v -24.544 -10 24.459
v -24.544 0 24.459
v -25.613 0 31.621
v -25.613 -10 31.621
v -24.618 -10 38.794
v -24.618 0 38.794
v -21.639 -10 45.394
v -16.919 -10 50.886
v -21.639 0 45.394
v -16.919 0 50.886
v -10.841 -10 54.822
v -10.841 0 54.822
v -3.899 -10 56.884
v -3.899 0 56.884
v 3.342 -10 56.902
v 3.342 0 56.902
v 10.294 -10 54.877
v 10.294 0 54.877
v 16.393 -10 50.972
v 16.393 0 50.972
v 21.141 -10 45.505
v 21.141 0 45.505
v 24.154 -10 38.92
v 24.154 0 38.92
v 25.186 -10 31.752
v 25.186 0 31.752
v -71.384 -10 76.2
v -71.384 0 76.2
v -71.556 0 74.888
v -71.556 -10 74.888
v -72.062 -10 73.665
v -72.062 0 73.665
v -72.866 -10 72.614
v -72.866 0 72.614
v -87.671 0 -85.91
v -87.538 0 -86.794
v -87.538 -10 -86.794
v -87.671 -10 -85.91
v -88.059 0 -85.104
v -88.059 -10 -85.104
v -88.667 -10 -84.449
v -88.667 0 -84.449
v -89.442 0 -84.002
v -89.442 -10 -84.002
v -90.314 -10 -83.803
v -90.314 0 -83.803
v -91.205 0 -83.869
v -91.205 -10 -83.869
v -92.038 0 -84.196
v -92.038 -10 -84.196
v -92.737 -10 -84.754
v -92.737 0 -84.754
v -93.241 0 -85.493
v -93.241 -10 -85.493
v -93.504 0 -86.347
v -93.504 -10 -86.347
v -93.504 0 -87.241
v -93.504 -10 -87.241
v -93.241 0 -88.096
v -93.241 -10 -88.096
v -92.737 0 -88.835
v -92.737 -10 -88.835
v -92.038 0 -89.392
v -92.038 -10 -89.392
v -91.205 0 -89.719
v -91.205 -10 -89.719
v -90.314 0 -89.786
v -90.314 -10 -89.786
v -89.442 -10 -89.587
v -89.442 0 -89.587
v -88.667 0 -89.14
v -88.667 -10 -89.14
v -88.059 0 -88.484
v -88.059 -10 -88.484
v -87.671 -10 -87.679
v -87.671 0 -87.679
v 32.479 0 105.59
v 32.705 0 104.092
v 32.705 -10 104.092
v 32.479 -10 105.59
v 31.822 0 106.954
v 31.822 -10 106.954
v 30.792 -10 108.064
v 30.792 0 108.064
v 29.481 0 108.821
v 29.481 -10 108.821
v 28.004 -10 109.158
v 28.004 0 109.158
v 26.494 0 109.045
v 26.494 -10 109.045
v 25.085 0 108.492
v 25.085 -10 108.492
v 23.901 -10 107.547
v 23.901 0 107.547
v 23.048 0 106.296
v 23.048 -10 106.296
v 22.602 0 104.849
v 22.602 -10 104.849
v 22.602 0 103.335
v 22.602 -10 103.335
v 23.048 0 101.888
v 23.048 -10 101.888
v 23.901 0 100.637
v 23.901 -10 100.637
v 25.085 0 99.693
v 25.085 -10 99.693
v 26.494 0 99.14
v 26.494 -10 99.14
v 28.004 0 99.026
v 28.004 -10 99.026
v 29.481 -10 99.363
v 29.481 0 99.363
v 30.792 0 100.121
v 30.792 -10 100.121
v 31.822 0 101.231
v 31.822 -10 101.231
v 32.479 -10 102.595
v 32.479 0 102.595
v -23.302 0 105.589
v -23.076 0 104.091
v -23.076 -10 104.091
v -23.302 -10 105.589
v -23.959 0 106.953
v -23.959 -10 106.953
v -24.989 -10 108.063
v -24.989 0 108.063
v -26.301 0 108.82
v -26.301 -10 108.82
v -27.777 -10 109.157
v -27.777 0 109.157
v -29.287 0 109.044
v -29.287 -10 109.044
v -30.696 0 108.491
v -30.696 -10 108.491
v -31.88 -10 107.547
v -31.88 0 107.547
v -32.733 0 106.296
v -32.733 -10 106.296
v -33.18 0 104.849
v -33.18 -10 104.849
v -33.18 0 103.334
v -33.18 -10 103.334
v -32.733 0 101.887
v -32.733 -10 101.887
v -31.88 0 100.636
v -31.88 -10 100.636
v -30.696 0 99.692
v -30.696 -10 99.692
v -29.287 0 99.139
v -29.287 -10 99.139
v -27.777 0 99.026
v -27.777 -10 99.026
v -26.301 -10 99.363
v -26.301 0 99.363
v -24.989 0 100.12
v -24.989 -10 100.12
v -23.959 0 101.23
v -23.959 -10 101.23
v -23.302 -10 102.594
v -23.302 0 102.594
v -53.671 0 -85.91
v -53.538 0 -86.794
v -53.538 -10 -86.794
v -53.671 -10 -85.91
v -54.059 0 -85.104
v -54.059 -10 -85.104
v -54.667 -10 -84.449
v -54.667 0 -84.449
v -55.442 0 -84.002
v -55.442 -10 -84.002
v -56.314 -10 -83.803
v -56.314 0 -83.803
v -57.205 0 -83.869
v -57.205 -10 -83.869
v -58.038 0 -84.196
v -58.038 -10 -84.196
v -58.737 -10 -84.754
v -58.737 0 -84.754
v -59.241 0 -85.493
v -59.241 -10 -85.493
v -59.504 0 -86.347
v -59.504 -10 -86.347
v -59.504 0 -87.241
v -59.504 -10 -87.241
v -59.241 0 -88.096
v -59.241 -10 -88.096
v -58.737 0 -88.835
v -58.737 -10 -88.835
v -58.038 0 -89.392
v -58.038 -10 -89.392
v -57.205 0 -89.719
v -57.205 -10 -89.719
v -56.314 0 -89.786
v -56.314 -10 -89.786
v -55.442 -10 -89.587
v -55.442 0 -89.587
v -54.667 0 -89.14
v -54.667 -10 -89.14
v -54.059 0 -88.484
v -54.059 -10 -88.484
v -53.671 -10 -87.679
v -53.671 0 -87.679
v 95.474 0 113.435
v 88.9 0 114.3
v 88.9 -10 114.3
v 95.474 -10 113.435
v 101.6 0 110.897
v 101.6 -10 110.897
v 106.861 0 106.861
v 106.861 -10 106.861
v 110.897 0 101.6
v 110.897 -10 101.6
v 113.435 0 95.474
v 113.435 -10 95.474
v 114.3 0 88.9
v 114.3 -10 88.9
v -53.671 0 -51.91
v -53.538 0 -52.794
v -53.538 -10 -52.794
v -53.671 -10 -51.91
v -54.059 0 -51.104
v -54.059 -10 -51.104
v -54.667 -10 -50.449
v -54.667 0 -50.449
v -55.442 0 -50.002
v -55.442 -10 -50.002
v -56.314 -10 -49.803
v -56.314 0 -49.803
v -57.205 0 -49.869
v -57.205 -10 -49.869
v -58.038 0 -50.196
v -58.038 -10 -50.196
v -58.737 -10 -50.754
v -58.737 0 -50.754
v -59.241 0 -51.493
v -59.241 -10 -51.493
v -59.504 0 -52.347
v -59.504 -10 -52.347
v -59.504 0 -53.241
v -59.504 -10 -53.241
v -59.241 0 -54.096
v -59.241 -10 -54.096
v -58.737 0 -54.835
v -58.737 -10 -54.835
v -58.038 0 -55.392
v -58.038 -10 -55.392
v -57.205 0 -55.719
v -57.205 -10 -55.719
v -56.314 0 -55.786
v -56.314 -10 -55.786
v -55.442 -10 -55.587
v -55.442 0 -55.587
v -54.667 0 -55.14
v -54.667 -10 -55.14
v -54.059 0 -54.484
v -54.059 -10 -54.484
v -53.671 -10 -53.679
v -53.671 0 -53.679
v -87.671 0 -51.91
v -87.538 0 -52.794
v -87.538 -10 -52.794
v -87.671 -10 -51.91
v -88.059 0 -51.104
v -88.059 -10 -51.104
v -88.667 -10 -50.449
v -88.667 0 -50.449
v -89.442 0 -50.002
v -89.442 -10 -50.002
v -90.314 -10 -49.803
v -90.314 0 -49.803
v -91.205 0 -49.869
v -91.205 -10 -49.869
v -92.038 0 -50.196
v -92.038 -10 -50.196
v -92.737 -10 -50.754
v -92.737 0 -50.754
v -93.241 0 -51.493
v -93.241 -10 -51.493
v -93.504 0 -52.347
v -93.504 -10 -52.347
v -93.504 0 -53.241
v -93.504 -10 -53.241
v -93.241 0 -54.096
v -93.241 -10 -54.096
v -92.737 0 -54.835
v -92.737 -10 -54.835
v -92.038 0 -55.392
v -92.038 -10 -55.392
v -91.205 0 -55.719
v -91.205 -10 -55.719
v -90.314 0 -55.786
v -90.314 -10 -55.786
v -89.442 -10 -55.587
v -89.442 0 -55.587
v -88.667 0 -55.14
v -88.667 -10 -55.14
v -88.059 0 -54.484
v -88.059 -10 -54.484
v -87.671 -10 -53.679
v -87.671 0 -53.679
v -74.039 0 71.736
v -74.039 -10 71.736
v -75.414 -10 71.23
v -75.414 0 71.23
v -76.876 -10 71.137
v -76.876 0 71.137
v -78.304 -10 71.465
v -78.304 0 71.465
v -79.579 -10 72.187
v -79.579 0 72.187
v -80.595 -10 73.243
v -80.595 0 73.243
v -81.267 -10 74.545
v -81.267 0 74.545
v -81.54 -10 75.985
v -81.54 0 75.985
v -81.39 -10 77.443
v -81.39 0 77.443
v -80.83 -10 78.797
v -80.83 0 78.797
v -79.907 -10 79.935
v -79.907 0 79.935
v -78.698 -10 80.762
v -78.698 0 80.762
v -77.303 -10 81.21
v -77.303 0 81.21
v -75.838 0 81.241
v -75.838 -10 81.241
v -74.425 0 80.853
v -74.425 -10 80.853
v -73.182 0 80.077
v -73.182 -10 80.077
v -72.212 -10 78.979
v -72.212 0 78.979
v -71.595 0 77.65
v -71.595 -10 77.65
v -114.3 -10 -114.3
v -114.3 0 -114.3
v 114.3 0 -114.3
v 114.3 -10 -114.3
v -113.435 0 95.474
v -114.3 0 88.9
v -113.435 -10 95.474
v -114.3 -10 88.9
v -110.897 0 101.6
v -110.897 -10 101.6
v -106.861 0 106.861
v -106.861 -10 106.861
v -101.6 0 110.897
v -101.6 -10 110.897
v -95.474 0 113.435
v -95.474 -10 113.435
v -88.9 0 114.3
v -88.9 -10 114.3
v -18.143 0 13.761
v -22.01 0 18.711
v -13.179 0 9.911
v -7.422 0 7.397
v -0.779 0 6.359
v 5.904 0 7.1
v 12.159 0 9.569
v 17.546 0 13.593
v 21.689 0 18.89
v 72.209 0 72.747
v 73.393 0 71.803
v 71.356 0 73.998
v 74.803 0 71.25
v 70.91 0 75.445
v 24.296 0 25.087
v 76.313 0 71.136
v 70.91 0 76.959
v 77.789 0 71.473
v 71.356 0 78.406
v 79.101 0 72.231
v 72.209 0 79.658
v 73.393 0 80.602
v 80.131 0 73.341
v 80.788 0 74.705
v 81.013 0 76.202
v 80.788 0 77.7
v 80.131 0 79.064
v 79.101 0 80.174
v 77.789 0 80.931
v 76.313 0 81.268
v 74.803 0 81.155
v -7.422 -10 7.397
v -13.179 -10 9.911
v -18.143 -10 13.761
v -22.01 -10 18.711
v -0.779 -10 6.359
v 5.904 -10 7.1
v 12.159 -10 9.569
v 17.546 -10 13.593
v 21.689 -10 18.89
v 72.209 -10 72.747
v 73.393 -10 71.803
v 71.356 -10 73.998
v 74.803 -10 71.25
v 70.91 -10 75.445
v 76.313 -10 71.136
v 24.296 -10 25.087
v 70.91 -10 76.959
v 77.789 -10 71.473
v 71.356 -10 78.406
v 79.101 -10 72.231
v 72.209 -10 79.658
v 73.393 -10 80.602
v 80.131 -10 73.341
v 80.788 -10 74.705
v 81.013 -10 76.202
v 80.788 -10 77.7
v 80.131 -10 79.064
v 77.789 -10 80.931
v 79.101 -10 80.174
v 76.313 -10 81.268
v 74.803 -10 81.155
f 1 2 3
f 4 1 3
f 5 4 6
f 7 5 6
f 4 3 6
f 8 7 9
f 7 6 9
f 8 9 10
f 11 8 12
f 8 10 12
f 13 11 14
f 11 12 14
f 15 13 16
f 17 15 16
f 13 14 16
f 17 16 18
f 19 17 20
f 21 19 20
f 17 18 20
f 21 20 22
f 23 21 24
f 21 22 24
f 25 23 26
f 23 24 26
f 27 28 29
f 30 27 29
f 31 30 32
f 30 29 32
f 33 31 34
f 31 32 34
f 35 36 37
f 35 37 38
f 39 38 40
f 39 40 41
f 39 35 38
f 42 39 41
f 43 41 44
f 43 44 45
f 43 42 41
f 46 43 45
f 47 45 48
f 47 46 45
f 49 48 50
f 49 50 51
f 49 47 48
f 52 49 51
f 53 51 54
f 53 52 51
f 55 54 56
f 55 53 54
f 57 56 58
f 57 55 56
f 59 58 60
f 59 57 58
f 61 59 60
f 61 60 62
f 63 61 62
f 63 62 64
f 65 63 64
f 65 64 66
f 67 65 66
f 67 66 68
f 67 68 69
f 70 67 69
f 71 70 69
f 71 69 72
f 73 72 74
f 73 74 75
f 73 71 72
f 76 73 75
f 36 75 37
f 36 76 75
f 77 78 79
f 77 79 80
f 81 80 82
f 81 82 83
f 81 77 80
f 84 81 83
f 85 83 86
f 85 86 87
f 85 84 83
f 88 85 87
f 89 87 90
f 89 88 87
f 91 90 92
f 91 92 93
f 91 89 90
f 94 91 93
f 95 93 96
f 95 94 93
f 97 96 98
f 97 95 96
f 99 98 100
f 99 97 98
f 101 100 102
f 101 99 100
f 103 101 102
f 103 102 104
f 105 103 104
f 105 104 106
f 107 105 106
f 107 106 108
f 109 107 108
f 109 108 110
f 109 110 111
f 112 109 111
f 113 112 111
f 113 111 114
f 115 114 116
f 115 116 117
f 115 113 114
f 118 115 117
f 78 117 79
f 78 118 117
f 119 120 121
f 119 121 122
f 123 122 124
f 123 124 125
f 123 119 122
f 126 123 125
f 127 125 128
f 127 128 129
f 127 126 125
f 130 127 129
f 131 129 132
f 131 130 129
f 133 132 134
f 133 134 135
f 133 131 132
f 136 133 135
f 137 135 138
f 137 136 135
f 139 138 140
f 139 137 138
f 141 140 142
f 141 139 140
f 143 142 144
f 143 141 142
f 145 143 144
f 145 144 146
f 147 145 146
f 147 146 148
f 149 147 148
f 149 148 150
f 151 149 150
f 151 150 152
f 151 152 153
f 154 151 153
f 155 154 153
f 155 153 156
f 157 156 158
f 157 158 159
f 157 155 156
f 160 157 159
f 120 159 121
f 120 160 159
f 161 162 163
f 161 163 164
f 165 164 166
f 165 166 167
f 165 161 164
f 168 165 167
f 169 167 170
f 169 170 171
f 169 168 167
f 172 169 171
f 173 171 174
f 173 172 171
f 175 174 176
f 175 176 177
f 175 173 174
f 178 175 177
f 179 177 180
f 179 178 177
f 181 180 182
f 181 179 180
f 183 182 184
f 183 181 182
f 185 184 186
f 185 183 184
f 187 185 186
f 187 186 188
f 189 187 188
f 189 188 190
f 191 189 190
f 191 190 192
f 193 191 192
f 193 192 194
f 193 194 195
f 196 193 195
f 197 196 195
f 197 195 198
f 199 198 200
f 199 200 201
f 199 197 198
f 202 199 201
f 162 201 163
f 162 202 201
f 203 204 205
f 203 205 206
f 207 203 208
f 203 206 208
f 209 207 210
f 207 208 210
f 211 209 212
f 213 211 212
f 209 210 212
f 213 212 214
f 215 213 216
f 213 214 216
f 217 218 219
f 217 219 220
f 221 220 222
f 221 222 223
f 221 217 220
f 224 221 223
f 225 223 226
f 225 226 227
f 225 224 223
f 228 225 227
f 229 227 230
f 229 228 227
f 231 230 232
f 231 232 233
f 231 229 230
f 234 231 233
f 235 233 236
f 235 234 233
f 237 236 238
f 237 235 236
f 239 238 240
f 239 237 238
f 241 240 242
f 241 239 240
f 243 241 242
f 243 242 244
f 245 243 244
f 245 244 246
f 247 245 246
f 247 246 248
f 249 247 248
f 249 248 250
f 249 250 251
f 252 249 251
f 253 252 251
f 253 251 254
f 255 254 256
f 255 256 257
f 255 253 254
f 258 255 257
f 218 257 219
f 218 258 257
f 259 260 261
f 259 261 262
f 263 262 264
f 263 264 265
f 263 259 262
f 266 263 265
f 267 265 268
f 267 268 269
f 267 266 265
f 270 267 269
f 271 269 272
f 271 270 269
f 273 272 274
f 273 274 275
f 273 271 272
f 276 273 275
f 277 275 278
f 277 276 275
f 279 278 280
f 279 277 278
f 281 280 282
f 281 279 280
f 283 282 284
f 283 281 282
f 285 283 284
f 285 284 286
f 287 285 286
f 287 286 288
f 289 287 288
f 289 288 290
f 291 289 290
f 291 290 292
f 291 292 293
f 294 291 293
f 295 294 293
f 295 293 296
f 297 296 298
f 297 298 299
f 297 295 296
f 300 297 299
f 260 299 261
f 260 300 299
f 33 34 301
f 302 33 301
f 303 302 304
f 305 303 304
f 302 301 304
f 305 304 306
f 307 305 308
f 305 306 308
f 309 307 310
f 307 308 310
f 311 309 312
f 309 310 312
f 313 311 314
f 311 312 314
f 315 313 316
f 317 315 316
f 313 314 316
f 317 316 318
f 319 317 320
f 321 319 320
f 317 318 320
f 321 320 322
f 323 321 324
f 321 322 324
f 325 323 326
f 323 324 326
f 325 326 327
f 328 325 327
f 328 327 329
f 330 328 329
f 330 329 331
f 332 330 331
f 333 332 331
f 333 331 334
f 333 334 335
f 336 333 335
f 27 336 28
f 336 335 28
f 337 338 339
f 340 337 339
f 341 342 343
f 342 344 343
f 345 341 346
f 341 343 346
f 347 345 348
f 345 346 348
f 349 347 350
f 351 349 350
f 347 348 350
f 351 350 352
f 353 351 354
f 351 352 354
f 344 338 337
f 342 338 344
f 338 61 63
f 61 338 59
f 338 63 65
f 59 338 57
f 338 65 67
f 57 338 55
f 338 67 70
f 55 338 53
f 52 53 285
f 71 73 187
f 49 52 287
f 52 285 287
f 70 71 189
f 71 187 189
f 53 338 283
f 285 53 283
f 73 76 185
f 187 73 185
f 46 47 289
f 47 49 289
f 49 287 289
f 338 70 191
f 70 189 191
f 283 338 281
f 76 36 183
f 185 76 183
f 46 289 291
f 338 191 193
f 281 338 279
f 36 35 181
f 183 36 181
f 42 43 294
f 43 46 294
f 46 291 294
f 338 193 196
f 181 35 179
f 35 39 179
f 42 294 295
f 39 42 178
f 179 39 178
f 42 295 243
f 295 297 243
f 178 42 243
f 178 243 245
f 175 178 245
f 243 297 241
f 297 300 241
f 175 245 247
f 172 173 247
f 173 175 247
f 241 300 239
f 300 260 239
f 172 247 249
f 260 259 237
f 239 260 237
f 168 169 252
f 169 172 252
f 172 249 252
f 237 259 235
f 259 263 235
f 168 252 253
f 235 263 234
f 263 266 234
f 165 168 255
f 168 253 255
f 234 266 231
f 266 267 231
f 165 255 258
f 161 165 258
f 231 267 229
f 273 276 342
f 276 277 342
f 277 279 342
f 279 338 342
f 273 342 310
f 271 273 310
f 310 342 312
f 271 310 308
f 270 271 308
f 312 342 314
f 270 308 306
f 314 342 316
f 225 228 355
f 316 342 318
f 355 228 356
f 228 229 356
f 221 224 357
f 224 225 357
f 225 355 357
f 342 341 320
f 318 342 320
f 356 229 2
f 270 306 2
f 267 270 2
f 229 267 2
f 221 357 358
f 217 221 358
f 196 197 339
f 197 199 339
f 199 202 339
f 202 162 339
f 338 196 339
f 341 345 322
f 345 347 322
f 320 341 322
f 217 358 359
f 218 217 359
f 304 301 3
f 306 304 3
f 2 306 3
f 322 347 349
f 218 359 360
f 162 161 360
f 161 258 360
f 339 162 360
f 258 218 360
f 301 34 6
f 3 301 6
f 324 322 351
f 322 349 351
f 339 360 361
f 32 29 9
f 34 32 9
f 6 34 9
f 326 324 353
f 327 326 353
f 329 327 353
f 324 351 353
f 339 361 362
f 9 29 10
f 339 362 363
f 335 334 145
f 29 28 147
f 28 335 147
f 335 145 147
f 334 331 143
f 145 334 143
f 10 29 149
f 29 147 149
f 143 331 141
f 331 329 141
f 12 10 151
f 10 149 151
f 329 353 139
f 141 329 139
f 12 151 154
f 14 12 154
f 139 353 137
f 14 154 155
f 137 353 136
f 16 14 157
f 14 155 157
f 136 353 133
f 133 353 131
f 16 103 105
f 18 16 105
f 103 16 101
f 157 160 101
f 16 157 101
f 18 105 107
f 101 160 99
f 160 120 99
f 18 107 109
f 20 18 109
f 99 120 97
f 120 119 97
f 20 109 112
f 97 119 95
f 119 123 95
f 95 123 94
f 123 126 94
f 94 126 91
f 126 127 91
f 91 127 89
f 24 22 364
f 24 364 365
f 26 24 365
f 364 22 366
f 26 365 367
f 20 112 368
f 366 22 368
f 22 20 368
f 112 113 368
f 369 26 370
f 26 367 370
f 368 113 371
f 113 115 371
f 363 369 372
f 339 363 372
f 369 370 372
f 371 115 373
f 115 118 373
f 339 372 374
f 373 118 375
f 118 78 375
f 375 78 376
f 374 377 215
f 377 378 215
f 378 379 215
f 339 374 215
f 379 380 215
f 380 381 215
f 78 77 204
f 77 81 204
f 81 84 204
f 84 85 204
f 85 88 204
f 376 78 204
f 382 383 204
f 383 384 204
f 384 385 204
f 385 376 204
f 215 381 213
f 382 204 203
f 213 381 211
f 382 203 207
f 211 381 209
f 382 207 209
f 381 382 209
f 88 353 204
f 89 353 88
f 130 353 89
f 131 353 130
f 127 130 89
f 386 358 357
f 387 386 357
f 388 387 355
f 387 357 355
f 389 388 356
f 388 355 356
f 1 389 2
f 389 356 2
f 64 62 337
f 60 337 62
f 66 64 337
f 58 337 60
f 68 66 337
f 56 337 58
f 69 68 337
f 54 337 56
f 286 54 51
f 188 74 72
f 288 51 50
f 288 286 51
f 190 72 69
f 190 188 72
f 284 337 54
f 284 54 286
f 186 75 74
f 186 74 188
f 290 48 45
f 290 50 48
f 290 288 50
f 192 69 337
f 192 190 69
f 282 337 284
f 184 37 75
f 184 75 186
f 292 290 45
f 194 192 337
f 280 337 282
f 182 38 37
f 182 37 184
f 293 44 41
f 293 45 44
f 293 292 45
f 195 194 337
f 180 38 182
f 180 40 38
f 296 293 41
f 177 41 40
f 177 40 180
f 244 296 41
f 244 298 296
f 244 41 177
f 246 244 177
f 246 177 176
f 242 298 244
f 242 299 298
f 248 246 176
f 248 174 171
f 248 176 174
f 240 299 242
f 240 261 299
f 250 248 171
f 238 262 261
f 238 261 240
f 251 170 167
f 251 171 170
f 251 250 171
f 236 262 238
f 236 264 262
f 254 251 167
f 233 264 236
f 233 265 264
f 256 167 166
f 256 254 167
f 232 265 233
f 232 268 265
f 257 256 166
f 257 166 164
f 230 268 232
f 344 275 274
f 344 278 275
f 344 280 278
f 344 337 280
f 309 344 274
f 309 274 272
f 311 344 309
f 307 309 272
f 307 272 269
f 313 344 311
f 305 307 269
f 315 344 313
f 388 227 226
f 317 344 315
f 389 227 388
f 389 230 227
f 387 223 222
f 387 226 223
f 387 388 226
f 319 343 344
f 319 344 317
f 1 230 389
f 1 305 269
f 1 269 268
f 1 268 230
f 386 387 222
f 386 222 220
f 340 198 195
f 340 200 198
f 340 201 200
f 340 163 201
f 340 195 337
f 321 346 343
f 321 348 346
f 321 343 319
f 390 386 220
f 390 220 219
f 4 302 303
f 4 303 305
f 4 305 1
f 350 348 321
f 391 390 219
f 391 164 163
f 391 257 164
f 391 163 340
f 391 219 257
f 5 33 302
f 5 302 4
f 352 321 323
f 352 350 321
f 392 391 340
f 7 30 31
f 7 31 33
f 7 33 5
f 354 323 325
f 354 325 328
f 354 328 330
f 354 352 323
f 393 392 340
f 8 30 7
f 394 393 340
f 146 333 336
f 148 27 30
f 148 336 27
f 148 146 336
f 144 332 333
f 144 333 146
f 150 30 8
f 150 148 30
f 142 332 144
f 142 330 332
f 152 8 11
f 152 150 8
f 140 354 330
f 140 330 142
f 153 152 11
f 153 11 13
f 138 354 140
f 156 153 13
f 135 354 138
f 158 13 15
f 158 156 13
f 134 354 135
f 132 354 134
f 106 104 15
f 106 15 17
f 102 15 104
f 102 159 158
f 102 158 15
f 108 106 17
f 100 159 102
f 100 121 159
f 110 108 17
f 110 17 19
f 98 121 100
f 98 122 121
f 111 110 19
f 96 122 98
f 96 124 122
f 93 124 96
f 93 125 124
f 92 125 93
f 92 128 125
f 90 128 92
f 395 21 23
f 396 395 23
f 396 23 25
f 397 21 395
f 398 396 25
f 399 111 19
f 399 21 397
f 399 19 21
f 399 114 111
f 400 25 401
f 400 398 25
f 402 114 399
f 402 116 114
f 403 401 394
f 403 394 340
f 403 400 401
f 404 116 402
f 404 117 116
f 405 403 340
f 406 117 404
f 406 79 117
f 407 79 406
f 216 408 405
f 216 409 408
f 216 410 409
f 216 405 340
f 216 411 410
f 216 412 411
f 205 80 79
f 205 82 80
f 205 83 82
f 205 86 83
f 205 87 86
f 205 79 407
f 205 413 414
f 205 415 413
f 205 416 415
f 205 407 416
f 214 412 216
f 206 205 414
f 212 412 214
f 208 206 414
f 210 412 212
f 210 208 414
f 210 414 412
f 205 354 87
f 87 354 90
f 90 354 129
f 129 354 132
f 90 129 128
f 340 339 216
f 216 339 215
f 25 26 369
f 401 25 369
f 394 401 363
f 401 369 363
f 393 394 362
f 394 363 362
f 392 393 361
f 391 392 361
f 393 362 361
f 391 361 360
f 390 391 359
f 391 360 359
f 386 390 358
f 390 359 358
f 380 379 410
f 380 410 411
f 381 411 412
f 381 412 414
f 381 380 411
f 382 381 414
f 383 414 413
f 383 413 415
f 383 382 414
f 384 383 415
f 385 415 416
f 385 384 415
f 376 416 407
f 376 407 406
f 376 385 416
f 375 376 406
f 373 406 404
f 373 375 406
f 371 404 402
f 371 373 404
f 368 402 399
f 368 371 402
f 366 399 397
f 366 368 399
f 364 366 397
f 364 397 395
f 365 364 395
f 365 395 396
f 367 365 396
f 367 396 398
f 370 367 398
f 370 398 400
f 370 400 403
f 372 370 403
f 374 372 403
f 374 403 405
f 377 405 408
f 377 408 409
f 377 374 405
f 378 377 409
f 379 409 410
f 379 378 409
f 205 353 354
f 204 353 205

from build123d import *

# Parameters (mm, degrees)
F0_W     = 228.6
F0_H     = 228.6
F0_R     = 3
F0_R_2   = 5.08
F1_DEPTH = 10
F2_R     = 25.4


with BuildPart() as f1:
    # F0 (on Front) → F1 (new body)
    with BuildSketch(Plane.XZ):
        Rectangle(F0_W, F0_H)
        with Locations((-90.537816, -86.794242)):
            Circle(F0_R, mode=Mode.SUBTRACT)
        with Locations((-56.537816, -86.794242)):
            Circle(F0_R, mode=Mode.SUBTRACT)
        with Locations((-90.537816, -52.794242)):
            Circle(F0_R, mode=Mode.SUBTRACT)
        with Locations((-56.537816, -52.794242)):
            Circle(F0_R, mode=Mode.SUBTRACT)
        with BuildLine():
            ThreePointArc((-7.422443, 7.396804), (-18.143127, 13.760824), (-24.544206, 24.459424))
            ThreePointArc((-24.544206, 24.459424), (-3.899198, 56.883584), (25.186284, 31.752383))
            ThreePointArc((25.186284, 31.752383), (14.985928, 11.402179), (-7.422443, 7.396804))
        make_face(mode=Mode.SUBTRACT)
        with BuildLine():
            ThreePointArc((-72.865814, 72.614118), (-81.159114, 78.139971), (-71.384126, 76.2))
            ThreePointArc((-71.384126, 76.2), (-71.769138, 74.260029), (-72.865814, 72.614118))
        make_face(mode=Mode.SUBTRACT)
        with Locations((-28.156495, 104.09138)):
            Circle(F0_R_2, mode=Mode.SUBTRACT)
        with Locations((27.624831, 104.092209)):
            Circle(F0_R_2, mode=Mode.SUBTRACT)
        with Locations((75.93329, 76.202263)):
            Circle(F0_R_2, mode=Mode.SUBTRACT)
    extrude(amount=F1_DEPTH)

    # F2
    f2_edges = [f1.edges().sort_by_distance(p)[0] for p in [
        (114.3, -5, 114.3),
        (-114.3, -5, 114.3),
    ]]
    fillet(f2_edges, radius=F2_R)


solid = f1.part
